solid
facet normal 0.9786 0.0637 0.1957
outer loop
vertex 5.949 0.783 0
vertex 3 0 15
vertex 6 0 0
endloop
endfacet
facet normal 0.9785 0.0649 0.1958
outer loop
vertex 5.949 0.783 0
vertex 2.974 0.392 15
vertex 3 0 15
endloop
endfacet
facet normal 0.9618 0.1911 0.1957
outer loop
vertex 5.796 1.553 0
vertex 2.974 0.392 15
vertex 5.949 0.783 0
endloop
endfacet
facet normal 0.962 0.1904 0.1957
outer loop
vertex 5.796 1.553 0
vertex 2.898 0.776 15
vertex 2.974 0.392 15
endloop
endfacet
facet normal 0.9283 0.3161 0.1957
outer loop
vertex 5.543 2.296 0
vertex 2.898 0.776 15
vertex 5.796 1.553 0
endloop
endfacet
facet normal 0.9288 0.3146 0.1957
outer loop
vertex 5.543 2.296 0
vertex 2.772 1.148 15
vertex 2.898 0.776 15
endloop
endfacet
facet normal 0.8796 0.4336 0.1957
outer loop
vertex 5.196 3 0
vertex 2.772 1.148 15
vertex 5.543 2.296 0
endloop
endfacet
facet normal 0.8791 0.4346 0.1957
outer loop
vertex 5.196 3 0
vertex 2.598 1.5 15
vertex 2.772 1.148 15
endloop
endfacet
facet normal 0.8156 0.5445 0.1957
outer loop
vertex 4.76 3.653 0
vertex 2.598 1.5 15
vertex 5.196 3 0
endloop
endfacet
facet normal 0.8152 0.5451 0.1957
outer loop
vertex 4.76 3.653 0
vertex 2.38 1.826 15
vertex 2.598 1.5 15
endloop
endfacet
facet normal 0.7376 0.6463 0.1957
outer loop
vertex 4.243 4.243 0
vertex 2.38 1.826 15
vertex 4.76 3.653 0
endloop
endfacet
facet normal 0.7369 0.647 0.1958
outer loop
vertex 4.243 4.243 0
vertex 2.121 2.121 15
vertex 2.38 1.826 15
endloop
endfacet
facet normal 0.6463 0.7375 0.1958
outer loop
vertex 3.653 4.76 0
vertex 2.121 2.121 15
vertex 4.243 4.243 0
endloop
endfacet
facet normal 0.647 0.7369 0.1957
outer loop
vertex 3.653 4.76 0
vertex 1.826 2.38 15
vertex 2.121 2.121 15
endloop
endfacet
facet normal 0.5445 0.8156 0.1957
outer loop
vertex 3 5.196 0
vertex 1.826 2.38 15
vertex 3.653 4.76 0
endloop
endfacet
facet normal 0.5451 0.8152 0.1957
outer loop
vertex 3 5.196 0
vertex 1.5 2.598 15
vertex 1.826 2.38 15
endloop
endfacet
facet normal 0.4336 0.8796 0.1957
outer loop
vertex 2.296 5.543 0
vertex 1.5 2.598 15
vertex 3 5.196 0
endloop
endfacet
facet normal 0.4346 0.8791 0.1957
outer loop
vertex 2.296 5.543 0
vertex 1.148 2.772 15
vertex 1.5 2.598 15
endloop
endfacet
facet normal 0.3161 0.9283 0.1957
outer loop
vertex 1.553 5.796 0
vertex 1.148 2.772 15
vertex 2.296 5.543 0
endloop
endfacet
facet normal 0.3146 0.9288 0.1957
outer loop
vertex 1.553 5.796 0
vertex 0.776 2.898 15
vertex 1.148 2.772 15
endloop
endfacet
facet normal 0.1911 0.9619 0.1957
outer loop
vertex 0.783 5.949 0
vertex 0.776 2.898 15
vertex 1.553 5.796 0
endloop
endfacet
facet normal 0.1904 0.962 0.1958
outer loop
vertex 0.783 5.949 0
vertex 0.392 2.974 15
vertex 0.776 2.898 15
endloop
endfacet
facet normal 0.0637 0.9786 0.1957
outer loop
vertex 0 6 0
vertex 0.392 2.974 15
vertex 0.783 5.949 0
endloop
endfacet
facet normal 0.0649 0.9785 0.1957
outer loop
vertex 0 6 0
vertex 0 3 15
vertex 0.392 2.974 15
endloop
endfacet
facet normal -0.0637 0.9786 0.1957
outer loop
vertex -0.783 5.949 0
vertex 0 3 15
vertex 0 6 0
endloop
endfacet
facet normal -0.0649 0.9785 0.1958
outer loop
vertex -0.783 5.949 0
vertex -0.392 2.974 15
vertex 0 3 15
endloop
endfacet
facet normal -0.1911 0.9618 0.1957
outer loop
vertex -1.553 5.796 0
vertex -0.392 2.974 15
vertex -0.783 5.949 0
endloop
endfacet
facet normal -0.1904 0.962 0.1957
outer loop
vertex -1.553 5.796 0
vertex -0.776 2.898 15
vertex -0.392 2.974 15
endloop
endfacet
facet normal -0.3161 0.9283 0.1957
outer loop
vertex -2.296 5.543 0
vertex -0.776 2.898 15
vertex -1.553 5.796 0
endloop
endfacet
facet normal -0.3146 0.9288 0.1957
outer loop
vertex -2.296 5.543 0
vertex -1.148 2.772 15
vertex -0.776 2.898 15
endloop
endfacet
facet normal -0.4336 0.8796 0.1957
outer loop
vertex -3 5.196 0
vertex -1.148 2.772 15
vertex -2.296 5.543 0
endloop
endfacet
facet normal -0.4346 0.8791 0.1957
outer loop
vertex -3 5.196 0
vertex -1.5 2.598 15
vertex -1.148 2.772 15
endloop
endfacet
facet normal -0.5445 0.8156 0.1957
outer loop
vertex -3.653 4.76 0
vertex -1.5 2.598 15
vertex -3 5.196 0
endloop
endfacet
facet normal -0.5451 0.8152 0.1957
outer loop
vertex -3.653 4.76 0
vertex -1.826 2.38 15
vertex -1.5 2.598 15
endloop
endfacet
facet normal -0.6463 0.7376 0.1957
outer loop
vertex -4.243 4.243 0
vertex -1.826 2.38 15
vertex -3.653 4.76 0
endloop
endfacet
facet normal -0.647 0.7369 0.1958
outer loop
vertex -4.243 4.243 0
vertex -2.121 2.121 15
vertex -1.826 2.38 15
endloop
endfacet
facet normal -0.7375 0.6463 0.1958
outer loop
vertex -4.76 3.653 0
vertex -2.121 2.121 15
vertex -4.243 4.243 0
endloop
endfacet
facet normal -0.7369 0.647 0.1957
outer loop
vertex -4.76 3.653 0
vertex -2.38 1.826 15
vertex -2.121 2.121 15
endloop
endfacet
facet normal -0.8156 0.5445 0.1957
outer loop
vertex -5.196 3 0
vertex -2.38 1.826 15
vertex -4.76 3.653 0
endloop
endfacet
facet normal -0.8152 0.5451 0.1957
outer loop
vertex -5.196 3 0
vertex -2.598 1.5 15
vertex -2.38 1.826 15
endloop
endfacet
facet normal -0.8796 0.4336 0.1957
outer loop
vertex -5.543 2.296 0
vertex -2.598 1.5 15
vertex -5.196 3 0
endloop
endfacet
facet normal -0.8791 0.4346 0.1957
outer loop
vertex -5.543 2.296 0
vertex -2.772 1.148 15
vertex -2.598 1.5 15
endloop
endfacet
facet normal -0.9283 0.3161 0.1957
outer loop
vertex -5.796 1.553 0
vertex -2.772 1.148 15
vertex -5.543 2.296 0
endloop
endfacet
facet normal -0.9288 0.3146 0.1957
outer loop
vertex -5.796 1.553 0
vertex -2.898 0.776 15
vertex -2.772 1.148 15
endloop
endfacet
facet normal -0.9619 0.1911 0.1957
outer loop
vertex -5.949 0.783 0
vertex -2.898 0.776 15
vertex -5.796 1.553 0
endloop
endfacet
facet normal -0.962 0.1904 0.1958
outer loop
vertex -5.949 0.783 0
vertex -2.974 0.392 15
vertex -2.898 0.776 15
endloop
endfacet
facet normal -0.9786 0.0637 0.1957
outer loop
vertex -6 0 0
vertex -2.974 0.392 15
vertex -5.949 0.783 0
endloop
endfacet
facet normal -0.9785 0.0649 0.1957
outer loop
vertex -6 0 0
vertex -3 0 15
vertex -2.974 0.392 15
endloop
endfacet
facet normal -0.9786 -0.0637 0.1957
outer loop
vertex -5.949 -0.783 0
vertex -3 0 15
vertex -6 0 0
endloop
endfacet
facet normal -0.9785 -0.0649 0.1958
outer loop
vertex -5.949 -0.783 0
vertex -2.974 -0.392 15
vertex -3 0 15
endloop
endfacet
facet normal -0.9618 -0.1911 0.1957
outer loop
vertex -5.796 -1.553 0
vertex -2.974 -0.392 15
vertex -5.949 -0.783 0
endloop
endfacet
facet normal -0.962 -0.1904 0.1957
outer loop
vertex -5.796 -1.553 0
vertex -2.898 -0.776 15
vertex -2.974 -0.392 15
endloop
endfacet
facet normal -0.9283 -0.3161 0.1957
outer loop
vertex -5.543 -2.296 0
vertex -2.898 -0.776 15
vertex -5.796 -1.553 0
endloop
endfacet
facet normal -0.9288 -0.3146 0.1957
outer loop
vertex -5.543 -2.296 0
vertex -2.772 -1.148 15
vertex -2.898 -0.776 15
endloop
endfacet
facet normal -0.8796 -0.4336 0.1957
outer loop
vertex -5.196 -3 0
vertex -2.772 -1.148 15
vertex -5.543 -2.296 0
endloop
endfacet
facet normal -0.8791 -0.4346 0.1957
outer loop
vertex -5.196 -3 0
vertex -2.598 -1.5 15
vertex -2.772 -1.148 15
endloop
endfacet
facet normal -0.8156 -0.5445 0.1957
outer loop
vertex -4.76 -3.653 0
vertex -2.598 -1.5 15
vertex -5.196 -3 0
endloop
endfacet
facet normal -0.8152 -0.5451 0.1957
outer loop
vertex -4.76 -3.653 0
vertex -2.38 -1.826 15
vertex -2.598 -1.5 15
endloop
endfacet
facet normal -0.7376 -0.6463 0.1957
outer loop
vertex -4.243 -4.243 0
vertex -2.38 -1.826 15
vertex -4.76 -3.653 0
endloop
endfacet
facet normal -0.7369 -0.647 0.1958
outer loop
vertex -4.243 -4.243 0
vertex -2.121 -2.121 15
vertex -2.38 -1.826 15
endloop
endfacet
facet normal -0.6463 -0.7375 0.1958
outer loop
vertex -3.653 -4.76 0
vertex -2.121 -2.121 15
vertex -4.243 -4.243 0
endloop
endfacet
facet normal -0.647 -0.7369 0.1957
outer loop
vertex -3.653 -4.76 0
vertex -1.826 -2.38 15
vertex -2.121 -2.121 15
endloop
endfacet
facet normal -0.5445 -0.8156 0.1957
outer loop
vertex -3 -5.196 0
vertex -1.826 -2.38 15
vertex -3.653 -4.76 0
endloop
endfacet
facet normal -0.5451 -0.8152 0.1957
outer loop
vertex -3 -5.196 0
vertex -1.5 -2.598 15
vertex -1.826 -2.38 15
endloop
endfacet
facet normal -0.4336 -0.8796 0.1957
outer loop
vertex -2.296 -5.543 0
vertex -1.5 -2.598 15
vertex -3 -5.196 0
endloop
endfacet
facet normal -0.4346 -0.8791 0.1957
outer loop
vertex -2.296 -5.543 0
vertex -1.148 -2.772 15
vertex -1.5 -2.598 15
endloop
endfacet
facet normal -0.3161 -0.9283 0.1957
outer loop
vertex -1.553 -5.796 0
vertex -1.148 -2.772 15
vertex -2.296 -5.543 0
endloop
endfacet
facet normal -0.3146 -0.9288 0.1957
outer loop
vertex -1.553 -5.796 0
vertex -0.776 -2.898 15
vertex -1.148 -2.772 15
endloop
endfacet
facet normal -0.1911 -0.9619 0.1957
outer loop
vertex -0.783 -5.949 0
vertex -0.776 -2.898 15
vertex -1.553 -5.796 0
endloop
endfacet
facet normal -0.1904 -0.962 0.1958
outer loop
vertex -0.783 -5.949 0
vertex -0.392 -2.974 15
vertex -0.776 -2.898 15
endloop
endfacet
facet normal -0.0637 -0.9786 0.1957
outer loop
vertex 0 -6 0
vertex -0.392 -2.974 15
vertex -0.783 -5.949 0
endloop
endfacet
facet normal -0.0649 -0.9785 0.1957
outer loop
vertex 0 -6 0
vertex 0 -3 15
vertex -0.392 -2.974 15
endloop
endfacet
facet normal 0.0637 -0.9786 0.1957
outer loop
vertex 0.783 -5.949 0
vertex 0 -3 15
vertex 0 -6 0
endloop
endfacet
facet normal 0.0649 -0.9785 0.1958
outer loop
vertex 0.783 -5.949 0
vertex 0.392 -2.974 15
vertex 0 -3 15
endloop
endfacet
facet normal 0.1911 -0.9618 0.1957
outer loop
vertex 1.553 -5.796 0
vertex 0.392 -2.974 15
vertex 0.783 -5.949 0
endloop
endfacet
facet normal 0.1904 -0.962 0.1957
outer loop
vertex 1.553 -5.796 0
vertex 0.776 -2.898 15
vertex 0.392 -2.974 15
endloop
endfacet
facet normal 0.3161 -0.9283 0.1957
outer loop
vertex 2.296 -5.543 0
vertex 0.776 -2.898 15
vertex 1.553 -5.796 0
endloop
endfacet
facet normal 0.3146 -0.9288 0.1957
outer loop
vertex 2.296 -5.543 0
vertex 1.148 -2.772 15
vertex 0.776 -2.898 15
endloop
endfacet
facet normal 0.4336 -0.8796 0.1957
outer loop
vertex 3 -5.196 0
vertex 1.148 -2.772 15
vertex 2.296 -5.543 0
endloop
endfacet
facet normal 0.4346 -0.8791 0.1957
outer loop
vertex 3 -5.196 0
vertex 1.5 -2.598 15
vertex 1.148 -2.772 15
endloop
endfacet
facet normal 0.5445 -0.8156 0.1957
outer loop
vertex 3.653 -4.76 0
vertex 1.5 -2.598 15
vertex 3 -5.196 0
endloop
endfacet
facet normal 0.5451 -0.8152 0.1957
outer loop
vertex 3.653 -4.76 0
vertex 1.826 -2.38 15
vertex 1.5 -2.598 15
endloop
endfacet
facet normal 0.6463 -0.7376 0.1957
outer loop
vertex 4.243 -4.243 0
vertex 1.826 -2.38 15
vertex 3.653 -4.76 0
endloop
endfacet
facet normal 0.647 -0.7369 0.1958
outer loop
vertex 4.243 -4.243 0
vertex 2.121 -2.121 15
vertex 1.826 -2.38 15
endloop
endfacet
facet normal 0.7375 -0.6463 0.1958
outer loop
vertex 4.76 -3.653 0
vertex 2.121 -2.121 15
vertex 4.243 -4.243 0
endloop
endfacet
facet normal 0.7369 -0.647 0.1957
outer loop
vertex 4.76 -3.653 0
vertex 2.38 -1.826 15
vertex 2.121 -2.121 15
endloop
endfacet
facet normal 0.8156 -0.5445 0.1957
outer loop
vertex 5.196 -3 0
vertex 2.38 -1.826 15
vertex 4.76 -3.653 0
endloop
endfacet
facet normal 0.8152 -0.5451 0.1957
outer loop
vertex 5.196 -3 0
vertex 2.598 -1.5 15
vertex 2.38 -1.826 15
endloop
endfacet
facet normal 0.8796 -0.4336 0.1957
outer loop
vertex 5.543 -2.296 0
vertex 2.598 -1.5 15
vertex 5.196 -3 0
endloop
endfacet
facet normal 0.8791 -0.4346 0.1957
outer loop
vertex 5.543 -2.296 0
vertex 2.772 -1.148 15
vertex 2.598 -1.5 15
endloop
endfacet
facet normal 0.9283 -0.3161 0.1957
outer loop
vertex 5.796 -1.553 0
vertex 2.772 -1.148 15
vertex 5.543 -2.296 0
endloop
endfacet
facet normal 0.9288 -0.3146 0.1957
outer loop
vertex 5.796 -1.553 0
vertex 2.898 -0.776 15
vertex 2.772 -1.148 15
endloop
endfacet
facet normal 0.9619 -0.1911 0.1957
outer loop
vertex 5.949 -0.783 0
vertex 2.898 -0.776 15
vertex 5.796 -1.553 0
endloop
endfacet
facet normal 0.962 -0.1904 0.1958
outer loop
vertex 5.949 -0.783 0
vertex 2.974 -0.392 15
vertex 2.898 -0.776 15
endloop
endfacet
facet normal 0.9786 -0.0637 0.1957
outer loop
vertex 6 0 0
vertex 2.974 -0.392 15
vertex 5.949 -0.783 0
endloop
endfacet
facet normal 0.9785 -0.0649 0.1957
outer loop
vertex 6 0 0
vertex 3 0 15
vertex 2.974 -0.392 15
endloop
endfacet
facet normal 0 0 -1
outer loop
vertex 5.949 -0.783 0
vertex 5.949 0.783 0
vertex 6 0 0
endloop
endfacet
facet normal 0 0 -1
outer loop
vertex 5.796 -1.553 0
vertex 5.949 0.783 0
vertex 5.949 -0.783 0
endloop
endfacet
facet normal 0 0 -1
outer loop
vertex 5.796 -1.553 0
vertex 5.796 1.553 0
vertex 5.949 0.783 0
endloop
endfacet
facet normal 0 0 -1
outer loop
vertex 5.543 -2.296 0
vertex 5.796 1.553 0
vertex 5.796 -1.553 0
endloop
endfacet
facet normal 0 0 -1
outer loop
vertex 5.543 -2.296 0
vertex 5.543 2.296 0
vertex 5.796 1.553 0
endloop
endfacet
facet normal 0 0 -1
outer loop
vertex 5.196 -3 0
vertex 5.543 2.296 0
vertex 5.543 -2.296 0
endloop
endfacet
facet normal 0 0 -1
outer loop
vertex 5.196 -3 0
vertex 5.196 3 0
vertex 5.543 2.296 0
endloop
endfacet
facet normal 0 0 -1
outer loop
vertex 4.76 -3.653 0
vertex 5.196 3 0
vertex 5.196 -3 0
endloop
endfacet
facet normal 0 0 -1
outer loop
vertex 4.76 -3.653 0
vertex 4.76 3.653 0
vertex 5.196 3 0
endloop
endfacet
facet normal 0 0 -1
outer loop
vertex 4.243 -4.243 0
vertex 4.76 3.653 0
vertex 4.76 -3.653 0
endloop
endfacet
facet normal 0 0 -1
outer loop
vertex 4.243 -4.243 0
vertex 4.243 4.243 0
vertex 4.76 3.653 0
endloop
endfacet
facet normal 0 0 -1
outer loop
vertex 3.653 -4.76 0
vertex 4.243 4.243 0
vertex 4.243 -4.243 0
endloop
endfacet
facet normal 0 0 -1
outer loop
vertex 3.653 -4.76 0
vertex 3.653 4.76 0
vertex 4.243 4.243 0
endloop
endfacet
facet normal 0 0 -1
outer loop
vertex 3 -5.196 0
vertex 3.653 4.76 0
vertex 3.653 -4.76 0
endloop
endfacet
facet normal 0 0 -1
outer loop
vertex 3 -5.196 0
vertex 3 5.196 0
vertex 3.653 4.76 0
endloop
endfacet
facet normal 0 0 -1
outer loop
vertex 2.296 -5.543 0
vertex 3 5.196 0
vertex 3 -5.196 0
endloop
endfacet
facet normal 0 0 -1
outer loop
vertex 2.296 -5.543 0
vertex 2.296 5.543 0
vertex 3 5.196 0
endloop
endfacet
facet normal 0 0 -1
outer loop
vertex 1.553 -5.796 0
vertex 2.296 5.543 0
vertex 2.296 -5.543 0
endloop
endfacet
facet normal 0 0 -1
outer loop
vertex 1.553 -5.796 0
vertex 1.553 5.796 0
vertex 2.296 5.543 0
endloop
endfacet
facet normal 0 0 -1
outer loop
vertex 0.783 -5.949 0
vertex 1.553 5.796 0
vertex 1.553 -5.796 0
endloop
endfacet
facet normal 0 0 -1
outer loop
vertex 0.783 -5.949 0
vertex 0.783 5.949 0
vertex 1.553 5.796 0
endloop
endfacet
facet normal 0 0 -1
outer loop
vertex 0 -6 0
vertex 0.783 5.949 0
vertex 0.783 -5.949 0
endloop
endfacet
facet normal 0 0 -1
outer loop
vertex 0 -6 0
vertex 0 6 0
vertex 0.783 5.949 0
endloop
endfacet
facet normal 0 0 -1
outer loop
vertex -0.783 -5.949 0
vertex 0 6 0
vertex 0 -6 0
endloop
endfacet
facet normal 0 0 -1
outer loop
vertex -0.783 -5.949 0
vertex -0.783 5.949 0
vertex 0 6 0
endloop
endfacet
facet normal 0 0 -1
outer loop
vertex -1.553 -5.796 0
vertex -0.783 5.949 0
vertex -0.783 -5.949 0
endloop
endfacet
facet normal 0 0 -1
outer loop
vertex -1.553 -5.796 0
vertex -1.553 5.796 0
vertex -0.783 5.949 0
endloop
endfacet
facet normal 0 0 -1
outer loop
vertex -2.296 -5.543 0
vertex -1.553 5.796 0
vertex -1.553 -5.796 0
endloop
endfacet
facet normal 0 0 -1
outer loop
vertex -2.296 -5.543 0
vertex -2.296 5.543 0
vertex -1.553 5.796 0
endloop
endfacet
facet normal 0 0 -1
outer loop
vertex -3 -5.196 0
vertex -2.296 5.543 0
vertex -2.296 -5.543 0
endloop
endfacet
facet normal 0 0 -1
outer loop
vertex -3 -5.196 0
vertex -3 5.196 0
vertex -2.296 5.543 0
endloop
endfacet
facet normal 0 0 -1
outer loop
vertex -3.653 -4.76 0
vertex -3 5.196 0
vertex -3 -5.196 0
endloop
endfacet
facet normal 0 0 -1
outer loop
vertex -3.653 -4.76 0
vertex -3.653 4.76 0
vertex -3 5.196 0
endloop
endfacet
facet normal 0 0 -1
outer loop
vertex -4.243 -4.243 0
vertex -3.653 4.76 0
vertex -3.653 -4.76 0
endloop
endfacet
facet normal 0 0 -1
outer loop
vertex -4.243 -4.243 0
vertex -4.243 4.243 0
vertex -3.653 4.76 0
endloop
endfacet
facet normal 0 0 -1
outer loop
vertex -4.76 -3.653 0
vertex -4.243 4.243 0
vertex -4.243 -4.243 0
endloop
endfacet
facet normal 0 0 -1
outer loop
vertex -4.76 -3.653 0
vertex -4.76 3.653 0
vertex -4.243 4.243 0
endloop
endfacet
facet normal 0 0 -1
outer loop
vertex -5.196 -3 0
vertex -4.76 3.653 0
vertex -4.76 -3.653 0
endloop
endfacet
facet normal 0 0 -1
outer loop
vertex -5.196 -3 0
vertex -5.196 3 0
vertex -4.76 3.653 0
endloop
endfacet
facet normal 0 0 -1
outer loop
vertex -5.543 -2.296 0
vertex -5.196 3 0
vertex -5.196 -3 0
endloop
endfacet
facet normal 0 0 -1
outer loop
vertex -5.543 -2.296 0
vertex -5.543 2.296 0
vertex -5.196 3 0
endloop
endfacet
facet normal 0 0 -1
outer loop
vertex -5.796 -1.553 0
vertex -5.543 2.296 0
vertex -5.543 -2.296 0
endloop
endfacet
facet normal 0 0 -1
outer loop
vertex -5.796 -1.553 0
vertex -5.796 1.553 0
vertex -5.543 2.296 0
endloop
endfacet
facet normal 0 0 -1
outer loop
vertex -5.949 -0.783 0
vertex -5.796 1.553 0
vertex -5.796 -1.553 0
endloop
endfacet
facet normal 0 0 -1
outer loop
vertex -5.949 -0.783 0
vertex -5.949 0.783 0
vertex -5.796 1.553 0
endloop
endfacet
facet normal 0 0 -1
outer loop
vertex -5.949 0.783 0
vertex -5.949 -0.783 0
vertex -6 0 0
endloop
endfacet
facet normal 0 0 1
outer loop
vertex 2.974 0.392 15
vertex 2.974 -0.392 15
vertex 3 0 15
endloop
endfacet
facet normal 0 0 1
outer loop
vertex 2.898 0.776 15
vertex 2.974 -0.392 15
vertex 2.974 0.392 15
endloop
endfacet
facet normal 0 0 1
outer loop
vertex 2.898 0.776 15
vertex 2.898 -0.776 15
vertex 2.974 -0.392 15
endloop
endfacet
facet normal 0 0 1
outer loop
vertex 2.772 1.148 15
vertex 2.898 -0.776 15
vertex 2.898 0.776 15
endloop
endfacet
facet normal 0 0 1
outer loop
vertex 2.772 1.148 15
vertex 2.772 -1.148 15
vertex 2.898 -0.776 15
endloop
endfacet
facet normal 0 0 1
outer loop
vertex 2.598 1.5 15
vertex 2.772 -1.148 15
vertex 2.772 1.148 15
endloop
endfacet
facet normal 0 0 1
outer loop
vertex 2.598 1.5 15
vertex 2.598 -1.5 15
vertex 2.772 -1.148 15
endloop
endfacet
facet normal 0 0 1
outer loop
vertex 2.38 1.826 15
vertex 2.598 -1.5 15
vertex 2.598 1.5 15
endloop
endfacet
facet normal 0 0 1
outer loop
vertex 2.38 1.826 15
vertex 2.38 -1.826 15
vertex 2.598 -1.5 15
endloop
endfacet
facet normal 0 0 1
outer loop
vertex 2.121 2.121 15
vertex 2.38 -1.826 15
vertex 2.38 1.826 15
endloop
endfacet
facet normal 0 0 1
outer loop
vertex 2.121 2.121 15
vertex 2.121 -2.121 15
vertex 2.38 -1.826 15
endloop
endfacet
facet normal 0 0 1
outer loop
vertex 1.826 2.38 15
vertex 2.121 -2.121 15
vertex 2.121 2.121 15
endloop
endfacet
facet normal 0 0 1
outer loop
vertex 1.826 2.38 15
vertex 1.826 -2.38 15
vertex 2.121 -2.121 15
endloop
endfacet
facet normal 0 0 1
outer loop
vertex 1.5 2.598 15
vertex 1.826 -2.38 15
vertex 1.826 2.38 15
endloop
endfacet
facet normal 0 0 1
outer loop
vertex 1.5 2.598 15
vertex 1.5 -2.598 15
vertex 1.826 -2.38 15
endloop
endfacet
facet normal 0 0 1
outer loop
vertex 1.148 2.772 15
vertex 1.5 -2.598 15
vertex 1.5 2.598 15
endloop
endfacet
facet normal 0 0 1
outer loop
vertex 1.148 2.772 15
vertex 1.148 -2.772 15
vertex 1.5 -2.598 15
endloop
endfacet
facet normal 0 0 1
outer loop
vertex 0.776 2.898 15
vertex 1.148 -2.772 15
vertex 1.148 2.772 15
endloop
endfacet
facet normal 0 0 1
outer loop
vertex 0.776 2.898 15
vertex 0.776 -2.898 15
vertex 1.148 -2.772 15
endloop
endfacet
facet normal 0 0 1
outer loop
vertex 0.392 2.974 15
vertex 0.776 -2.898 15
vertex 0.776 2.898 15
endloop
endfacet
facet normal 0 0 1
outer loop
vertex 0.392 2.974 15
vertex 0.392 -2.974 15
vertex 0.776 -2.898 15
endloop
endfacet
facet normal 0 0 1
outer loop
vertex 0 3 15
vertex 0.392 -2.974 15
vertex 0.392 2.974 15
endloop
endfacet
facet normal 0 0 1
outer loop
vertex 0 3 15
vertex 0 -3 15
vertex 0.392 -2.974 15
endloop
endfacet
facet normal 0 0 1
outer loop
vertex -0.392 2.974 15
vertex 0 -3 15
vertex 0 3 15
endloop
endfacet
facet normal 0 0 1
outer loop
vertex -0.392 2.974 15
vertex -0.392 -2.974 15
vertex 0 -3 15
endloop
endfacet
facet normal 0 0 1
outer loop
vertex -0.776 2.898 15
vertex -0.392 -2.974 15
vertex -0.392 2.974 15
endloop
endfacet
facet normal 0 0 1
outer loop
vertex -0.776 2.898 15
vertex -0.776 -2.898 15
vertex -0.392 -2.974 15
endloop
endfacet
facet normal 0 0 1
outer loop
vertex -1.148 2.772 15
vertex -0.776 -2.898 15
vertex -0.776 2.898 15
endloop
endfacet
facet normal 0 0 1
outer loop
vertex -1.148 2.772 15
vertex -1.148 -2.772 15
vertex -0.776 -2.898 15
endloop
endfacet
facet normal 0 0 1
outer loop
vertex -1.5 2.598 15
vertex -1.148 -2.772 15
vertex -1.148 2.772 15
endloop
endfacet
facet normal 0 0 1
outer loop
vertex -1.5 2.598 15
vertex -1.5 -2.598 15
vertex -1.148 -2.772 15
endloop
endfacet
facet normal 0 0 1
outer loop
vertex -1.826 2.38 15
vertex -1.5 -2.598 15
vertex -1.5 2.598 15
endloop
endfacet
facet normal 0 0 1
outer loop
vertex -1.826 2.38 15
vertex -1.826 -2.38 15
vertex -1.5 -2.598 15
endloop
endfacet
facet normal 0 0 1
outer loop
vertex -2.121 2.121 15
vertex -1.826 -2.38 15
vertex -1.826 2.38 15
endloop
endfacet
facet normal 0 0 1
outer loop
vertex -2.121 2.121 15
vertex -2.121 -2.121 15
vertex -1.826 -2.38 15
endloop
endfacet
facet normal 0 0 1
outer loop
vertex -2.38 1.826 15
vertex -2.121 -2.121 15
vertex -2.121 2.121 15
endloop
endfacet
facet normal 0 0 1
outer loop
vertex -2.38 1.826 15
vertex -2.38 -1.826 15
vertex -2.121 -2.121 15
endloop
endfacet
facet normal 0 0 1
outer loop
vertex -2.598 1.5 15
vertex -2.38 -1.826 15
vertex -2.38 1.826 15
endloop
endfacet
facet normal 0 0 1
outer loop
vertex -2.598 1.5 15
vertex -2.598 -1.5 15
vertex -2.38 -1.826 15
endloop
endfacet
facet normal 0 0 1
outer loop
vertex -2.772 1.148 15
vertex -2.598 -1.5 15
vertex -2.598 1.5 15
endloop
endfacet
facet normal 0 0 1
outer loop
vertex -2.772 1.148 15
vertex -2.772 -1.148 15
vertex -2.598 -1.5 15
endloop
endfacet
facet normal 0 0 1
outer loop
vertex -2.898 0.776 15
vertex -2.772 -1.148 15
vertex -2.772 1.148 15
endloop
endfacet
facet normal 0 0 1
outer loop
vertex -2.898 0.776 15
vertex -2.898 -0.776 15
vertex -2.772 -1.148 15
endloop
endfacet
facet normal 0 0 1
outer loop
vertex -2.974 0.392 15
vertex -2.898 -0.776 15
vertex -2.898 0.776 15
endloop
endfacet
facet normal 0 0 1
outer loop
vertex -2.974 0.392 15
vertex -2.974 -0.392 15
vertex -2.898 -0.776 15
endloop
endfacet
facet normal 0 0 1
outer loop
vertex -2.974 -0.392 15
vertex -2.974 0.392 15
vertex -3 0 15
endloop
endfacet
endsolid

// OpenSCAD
// Construct: cylinder() sized by diameter params d1 / d2.
cylinder(h = 15, d1 = 12, d2 = 6, $fn = 48);
